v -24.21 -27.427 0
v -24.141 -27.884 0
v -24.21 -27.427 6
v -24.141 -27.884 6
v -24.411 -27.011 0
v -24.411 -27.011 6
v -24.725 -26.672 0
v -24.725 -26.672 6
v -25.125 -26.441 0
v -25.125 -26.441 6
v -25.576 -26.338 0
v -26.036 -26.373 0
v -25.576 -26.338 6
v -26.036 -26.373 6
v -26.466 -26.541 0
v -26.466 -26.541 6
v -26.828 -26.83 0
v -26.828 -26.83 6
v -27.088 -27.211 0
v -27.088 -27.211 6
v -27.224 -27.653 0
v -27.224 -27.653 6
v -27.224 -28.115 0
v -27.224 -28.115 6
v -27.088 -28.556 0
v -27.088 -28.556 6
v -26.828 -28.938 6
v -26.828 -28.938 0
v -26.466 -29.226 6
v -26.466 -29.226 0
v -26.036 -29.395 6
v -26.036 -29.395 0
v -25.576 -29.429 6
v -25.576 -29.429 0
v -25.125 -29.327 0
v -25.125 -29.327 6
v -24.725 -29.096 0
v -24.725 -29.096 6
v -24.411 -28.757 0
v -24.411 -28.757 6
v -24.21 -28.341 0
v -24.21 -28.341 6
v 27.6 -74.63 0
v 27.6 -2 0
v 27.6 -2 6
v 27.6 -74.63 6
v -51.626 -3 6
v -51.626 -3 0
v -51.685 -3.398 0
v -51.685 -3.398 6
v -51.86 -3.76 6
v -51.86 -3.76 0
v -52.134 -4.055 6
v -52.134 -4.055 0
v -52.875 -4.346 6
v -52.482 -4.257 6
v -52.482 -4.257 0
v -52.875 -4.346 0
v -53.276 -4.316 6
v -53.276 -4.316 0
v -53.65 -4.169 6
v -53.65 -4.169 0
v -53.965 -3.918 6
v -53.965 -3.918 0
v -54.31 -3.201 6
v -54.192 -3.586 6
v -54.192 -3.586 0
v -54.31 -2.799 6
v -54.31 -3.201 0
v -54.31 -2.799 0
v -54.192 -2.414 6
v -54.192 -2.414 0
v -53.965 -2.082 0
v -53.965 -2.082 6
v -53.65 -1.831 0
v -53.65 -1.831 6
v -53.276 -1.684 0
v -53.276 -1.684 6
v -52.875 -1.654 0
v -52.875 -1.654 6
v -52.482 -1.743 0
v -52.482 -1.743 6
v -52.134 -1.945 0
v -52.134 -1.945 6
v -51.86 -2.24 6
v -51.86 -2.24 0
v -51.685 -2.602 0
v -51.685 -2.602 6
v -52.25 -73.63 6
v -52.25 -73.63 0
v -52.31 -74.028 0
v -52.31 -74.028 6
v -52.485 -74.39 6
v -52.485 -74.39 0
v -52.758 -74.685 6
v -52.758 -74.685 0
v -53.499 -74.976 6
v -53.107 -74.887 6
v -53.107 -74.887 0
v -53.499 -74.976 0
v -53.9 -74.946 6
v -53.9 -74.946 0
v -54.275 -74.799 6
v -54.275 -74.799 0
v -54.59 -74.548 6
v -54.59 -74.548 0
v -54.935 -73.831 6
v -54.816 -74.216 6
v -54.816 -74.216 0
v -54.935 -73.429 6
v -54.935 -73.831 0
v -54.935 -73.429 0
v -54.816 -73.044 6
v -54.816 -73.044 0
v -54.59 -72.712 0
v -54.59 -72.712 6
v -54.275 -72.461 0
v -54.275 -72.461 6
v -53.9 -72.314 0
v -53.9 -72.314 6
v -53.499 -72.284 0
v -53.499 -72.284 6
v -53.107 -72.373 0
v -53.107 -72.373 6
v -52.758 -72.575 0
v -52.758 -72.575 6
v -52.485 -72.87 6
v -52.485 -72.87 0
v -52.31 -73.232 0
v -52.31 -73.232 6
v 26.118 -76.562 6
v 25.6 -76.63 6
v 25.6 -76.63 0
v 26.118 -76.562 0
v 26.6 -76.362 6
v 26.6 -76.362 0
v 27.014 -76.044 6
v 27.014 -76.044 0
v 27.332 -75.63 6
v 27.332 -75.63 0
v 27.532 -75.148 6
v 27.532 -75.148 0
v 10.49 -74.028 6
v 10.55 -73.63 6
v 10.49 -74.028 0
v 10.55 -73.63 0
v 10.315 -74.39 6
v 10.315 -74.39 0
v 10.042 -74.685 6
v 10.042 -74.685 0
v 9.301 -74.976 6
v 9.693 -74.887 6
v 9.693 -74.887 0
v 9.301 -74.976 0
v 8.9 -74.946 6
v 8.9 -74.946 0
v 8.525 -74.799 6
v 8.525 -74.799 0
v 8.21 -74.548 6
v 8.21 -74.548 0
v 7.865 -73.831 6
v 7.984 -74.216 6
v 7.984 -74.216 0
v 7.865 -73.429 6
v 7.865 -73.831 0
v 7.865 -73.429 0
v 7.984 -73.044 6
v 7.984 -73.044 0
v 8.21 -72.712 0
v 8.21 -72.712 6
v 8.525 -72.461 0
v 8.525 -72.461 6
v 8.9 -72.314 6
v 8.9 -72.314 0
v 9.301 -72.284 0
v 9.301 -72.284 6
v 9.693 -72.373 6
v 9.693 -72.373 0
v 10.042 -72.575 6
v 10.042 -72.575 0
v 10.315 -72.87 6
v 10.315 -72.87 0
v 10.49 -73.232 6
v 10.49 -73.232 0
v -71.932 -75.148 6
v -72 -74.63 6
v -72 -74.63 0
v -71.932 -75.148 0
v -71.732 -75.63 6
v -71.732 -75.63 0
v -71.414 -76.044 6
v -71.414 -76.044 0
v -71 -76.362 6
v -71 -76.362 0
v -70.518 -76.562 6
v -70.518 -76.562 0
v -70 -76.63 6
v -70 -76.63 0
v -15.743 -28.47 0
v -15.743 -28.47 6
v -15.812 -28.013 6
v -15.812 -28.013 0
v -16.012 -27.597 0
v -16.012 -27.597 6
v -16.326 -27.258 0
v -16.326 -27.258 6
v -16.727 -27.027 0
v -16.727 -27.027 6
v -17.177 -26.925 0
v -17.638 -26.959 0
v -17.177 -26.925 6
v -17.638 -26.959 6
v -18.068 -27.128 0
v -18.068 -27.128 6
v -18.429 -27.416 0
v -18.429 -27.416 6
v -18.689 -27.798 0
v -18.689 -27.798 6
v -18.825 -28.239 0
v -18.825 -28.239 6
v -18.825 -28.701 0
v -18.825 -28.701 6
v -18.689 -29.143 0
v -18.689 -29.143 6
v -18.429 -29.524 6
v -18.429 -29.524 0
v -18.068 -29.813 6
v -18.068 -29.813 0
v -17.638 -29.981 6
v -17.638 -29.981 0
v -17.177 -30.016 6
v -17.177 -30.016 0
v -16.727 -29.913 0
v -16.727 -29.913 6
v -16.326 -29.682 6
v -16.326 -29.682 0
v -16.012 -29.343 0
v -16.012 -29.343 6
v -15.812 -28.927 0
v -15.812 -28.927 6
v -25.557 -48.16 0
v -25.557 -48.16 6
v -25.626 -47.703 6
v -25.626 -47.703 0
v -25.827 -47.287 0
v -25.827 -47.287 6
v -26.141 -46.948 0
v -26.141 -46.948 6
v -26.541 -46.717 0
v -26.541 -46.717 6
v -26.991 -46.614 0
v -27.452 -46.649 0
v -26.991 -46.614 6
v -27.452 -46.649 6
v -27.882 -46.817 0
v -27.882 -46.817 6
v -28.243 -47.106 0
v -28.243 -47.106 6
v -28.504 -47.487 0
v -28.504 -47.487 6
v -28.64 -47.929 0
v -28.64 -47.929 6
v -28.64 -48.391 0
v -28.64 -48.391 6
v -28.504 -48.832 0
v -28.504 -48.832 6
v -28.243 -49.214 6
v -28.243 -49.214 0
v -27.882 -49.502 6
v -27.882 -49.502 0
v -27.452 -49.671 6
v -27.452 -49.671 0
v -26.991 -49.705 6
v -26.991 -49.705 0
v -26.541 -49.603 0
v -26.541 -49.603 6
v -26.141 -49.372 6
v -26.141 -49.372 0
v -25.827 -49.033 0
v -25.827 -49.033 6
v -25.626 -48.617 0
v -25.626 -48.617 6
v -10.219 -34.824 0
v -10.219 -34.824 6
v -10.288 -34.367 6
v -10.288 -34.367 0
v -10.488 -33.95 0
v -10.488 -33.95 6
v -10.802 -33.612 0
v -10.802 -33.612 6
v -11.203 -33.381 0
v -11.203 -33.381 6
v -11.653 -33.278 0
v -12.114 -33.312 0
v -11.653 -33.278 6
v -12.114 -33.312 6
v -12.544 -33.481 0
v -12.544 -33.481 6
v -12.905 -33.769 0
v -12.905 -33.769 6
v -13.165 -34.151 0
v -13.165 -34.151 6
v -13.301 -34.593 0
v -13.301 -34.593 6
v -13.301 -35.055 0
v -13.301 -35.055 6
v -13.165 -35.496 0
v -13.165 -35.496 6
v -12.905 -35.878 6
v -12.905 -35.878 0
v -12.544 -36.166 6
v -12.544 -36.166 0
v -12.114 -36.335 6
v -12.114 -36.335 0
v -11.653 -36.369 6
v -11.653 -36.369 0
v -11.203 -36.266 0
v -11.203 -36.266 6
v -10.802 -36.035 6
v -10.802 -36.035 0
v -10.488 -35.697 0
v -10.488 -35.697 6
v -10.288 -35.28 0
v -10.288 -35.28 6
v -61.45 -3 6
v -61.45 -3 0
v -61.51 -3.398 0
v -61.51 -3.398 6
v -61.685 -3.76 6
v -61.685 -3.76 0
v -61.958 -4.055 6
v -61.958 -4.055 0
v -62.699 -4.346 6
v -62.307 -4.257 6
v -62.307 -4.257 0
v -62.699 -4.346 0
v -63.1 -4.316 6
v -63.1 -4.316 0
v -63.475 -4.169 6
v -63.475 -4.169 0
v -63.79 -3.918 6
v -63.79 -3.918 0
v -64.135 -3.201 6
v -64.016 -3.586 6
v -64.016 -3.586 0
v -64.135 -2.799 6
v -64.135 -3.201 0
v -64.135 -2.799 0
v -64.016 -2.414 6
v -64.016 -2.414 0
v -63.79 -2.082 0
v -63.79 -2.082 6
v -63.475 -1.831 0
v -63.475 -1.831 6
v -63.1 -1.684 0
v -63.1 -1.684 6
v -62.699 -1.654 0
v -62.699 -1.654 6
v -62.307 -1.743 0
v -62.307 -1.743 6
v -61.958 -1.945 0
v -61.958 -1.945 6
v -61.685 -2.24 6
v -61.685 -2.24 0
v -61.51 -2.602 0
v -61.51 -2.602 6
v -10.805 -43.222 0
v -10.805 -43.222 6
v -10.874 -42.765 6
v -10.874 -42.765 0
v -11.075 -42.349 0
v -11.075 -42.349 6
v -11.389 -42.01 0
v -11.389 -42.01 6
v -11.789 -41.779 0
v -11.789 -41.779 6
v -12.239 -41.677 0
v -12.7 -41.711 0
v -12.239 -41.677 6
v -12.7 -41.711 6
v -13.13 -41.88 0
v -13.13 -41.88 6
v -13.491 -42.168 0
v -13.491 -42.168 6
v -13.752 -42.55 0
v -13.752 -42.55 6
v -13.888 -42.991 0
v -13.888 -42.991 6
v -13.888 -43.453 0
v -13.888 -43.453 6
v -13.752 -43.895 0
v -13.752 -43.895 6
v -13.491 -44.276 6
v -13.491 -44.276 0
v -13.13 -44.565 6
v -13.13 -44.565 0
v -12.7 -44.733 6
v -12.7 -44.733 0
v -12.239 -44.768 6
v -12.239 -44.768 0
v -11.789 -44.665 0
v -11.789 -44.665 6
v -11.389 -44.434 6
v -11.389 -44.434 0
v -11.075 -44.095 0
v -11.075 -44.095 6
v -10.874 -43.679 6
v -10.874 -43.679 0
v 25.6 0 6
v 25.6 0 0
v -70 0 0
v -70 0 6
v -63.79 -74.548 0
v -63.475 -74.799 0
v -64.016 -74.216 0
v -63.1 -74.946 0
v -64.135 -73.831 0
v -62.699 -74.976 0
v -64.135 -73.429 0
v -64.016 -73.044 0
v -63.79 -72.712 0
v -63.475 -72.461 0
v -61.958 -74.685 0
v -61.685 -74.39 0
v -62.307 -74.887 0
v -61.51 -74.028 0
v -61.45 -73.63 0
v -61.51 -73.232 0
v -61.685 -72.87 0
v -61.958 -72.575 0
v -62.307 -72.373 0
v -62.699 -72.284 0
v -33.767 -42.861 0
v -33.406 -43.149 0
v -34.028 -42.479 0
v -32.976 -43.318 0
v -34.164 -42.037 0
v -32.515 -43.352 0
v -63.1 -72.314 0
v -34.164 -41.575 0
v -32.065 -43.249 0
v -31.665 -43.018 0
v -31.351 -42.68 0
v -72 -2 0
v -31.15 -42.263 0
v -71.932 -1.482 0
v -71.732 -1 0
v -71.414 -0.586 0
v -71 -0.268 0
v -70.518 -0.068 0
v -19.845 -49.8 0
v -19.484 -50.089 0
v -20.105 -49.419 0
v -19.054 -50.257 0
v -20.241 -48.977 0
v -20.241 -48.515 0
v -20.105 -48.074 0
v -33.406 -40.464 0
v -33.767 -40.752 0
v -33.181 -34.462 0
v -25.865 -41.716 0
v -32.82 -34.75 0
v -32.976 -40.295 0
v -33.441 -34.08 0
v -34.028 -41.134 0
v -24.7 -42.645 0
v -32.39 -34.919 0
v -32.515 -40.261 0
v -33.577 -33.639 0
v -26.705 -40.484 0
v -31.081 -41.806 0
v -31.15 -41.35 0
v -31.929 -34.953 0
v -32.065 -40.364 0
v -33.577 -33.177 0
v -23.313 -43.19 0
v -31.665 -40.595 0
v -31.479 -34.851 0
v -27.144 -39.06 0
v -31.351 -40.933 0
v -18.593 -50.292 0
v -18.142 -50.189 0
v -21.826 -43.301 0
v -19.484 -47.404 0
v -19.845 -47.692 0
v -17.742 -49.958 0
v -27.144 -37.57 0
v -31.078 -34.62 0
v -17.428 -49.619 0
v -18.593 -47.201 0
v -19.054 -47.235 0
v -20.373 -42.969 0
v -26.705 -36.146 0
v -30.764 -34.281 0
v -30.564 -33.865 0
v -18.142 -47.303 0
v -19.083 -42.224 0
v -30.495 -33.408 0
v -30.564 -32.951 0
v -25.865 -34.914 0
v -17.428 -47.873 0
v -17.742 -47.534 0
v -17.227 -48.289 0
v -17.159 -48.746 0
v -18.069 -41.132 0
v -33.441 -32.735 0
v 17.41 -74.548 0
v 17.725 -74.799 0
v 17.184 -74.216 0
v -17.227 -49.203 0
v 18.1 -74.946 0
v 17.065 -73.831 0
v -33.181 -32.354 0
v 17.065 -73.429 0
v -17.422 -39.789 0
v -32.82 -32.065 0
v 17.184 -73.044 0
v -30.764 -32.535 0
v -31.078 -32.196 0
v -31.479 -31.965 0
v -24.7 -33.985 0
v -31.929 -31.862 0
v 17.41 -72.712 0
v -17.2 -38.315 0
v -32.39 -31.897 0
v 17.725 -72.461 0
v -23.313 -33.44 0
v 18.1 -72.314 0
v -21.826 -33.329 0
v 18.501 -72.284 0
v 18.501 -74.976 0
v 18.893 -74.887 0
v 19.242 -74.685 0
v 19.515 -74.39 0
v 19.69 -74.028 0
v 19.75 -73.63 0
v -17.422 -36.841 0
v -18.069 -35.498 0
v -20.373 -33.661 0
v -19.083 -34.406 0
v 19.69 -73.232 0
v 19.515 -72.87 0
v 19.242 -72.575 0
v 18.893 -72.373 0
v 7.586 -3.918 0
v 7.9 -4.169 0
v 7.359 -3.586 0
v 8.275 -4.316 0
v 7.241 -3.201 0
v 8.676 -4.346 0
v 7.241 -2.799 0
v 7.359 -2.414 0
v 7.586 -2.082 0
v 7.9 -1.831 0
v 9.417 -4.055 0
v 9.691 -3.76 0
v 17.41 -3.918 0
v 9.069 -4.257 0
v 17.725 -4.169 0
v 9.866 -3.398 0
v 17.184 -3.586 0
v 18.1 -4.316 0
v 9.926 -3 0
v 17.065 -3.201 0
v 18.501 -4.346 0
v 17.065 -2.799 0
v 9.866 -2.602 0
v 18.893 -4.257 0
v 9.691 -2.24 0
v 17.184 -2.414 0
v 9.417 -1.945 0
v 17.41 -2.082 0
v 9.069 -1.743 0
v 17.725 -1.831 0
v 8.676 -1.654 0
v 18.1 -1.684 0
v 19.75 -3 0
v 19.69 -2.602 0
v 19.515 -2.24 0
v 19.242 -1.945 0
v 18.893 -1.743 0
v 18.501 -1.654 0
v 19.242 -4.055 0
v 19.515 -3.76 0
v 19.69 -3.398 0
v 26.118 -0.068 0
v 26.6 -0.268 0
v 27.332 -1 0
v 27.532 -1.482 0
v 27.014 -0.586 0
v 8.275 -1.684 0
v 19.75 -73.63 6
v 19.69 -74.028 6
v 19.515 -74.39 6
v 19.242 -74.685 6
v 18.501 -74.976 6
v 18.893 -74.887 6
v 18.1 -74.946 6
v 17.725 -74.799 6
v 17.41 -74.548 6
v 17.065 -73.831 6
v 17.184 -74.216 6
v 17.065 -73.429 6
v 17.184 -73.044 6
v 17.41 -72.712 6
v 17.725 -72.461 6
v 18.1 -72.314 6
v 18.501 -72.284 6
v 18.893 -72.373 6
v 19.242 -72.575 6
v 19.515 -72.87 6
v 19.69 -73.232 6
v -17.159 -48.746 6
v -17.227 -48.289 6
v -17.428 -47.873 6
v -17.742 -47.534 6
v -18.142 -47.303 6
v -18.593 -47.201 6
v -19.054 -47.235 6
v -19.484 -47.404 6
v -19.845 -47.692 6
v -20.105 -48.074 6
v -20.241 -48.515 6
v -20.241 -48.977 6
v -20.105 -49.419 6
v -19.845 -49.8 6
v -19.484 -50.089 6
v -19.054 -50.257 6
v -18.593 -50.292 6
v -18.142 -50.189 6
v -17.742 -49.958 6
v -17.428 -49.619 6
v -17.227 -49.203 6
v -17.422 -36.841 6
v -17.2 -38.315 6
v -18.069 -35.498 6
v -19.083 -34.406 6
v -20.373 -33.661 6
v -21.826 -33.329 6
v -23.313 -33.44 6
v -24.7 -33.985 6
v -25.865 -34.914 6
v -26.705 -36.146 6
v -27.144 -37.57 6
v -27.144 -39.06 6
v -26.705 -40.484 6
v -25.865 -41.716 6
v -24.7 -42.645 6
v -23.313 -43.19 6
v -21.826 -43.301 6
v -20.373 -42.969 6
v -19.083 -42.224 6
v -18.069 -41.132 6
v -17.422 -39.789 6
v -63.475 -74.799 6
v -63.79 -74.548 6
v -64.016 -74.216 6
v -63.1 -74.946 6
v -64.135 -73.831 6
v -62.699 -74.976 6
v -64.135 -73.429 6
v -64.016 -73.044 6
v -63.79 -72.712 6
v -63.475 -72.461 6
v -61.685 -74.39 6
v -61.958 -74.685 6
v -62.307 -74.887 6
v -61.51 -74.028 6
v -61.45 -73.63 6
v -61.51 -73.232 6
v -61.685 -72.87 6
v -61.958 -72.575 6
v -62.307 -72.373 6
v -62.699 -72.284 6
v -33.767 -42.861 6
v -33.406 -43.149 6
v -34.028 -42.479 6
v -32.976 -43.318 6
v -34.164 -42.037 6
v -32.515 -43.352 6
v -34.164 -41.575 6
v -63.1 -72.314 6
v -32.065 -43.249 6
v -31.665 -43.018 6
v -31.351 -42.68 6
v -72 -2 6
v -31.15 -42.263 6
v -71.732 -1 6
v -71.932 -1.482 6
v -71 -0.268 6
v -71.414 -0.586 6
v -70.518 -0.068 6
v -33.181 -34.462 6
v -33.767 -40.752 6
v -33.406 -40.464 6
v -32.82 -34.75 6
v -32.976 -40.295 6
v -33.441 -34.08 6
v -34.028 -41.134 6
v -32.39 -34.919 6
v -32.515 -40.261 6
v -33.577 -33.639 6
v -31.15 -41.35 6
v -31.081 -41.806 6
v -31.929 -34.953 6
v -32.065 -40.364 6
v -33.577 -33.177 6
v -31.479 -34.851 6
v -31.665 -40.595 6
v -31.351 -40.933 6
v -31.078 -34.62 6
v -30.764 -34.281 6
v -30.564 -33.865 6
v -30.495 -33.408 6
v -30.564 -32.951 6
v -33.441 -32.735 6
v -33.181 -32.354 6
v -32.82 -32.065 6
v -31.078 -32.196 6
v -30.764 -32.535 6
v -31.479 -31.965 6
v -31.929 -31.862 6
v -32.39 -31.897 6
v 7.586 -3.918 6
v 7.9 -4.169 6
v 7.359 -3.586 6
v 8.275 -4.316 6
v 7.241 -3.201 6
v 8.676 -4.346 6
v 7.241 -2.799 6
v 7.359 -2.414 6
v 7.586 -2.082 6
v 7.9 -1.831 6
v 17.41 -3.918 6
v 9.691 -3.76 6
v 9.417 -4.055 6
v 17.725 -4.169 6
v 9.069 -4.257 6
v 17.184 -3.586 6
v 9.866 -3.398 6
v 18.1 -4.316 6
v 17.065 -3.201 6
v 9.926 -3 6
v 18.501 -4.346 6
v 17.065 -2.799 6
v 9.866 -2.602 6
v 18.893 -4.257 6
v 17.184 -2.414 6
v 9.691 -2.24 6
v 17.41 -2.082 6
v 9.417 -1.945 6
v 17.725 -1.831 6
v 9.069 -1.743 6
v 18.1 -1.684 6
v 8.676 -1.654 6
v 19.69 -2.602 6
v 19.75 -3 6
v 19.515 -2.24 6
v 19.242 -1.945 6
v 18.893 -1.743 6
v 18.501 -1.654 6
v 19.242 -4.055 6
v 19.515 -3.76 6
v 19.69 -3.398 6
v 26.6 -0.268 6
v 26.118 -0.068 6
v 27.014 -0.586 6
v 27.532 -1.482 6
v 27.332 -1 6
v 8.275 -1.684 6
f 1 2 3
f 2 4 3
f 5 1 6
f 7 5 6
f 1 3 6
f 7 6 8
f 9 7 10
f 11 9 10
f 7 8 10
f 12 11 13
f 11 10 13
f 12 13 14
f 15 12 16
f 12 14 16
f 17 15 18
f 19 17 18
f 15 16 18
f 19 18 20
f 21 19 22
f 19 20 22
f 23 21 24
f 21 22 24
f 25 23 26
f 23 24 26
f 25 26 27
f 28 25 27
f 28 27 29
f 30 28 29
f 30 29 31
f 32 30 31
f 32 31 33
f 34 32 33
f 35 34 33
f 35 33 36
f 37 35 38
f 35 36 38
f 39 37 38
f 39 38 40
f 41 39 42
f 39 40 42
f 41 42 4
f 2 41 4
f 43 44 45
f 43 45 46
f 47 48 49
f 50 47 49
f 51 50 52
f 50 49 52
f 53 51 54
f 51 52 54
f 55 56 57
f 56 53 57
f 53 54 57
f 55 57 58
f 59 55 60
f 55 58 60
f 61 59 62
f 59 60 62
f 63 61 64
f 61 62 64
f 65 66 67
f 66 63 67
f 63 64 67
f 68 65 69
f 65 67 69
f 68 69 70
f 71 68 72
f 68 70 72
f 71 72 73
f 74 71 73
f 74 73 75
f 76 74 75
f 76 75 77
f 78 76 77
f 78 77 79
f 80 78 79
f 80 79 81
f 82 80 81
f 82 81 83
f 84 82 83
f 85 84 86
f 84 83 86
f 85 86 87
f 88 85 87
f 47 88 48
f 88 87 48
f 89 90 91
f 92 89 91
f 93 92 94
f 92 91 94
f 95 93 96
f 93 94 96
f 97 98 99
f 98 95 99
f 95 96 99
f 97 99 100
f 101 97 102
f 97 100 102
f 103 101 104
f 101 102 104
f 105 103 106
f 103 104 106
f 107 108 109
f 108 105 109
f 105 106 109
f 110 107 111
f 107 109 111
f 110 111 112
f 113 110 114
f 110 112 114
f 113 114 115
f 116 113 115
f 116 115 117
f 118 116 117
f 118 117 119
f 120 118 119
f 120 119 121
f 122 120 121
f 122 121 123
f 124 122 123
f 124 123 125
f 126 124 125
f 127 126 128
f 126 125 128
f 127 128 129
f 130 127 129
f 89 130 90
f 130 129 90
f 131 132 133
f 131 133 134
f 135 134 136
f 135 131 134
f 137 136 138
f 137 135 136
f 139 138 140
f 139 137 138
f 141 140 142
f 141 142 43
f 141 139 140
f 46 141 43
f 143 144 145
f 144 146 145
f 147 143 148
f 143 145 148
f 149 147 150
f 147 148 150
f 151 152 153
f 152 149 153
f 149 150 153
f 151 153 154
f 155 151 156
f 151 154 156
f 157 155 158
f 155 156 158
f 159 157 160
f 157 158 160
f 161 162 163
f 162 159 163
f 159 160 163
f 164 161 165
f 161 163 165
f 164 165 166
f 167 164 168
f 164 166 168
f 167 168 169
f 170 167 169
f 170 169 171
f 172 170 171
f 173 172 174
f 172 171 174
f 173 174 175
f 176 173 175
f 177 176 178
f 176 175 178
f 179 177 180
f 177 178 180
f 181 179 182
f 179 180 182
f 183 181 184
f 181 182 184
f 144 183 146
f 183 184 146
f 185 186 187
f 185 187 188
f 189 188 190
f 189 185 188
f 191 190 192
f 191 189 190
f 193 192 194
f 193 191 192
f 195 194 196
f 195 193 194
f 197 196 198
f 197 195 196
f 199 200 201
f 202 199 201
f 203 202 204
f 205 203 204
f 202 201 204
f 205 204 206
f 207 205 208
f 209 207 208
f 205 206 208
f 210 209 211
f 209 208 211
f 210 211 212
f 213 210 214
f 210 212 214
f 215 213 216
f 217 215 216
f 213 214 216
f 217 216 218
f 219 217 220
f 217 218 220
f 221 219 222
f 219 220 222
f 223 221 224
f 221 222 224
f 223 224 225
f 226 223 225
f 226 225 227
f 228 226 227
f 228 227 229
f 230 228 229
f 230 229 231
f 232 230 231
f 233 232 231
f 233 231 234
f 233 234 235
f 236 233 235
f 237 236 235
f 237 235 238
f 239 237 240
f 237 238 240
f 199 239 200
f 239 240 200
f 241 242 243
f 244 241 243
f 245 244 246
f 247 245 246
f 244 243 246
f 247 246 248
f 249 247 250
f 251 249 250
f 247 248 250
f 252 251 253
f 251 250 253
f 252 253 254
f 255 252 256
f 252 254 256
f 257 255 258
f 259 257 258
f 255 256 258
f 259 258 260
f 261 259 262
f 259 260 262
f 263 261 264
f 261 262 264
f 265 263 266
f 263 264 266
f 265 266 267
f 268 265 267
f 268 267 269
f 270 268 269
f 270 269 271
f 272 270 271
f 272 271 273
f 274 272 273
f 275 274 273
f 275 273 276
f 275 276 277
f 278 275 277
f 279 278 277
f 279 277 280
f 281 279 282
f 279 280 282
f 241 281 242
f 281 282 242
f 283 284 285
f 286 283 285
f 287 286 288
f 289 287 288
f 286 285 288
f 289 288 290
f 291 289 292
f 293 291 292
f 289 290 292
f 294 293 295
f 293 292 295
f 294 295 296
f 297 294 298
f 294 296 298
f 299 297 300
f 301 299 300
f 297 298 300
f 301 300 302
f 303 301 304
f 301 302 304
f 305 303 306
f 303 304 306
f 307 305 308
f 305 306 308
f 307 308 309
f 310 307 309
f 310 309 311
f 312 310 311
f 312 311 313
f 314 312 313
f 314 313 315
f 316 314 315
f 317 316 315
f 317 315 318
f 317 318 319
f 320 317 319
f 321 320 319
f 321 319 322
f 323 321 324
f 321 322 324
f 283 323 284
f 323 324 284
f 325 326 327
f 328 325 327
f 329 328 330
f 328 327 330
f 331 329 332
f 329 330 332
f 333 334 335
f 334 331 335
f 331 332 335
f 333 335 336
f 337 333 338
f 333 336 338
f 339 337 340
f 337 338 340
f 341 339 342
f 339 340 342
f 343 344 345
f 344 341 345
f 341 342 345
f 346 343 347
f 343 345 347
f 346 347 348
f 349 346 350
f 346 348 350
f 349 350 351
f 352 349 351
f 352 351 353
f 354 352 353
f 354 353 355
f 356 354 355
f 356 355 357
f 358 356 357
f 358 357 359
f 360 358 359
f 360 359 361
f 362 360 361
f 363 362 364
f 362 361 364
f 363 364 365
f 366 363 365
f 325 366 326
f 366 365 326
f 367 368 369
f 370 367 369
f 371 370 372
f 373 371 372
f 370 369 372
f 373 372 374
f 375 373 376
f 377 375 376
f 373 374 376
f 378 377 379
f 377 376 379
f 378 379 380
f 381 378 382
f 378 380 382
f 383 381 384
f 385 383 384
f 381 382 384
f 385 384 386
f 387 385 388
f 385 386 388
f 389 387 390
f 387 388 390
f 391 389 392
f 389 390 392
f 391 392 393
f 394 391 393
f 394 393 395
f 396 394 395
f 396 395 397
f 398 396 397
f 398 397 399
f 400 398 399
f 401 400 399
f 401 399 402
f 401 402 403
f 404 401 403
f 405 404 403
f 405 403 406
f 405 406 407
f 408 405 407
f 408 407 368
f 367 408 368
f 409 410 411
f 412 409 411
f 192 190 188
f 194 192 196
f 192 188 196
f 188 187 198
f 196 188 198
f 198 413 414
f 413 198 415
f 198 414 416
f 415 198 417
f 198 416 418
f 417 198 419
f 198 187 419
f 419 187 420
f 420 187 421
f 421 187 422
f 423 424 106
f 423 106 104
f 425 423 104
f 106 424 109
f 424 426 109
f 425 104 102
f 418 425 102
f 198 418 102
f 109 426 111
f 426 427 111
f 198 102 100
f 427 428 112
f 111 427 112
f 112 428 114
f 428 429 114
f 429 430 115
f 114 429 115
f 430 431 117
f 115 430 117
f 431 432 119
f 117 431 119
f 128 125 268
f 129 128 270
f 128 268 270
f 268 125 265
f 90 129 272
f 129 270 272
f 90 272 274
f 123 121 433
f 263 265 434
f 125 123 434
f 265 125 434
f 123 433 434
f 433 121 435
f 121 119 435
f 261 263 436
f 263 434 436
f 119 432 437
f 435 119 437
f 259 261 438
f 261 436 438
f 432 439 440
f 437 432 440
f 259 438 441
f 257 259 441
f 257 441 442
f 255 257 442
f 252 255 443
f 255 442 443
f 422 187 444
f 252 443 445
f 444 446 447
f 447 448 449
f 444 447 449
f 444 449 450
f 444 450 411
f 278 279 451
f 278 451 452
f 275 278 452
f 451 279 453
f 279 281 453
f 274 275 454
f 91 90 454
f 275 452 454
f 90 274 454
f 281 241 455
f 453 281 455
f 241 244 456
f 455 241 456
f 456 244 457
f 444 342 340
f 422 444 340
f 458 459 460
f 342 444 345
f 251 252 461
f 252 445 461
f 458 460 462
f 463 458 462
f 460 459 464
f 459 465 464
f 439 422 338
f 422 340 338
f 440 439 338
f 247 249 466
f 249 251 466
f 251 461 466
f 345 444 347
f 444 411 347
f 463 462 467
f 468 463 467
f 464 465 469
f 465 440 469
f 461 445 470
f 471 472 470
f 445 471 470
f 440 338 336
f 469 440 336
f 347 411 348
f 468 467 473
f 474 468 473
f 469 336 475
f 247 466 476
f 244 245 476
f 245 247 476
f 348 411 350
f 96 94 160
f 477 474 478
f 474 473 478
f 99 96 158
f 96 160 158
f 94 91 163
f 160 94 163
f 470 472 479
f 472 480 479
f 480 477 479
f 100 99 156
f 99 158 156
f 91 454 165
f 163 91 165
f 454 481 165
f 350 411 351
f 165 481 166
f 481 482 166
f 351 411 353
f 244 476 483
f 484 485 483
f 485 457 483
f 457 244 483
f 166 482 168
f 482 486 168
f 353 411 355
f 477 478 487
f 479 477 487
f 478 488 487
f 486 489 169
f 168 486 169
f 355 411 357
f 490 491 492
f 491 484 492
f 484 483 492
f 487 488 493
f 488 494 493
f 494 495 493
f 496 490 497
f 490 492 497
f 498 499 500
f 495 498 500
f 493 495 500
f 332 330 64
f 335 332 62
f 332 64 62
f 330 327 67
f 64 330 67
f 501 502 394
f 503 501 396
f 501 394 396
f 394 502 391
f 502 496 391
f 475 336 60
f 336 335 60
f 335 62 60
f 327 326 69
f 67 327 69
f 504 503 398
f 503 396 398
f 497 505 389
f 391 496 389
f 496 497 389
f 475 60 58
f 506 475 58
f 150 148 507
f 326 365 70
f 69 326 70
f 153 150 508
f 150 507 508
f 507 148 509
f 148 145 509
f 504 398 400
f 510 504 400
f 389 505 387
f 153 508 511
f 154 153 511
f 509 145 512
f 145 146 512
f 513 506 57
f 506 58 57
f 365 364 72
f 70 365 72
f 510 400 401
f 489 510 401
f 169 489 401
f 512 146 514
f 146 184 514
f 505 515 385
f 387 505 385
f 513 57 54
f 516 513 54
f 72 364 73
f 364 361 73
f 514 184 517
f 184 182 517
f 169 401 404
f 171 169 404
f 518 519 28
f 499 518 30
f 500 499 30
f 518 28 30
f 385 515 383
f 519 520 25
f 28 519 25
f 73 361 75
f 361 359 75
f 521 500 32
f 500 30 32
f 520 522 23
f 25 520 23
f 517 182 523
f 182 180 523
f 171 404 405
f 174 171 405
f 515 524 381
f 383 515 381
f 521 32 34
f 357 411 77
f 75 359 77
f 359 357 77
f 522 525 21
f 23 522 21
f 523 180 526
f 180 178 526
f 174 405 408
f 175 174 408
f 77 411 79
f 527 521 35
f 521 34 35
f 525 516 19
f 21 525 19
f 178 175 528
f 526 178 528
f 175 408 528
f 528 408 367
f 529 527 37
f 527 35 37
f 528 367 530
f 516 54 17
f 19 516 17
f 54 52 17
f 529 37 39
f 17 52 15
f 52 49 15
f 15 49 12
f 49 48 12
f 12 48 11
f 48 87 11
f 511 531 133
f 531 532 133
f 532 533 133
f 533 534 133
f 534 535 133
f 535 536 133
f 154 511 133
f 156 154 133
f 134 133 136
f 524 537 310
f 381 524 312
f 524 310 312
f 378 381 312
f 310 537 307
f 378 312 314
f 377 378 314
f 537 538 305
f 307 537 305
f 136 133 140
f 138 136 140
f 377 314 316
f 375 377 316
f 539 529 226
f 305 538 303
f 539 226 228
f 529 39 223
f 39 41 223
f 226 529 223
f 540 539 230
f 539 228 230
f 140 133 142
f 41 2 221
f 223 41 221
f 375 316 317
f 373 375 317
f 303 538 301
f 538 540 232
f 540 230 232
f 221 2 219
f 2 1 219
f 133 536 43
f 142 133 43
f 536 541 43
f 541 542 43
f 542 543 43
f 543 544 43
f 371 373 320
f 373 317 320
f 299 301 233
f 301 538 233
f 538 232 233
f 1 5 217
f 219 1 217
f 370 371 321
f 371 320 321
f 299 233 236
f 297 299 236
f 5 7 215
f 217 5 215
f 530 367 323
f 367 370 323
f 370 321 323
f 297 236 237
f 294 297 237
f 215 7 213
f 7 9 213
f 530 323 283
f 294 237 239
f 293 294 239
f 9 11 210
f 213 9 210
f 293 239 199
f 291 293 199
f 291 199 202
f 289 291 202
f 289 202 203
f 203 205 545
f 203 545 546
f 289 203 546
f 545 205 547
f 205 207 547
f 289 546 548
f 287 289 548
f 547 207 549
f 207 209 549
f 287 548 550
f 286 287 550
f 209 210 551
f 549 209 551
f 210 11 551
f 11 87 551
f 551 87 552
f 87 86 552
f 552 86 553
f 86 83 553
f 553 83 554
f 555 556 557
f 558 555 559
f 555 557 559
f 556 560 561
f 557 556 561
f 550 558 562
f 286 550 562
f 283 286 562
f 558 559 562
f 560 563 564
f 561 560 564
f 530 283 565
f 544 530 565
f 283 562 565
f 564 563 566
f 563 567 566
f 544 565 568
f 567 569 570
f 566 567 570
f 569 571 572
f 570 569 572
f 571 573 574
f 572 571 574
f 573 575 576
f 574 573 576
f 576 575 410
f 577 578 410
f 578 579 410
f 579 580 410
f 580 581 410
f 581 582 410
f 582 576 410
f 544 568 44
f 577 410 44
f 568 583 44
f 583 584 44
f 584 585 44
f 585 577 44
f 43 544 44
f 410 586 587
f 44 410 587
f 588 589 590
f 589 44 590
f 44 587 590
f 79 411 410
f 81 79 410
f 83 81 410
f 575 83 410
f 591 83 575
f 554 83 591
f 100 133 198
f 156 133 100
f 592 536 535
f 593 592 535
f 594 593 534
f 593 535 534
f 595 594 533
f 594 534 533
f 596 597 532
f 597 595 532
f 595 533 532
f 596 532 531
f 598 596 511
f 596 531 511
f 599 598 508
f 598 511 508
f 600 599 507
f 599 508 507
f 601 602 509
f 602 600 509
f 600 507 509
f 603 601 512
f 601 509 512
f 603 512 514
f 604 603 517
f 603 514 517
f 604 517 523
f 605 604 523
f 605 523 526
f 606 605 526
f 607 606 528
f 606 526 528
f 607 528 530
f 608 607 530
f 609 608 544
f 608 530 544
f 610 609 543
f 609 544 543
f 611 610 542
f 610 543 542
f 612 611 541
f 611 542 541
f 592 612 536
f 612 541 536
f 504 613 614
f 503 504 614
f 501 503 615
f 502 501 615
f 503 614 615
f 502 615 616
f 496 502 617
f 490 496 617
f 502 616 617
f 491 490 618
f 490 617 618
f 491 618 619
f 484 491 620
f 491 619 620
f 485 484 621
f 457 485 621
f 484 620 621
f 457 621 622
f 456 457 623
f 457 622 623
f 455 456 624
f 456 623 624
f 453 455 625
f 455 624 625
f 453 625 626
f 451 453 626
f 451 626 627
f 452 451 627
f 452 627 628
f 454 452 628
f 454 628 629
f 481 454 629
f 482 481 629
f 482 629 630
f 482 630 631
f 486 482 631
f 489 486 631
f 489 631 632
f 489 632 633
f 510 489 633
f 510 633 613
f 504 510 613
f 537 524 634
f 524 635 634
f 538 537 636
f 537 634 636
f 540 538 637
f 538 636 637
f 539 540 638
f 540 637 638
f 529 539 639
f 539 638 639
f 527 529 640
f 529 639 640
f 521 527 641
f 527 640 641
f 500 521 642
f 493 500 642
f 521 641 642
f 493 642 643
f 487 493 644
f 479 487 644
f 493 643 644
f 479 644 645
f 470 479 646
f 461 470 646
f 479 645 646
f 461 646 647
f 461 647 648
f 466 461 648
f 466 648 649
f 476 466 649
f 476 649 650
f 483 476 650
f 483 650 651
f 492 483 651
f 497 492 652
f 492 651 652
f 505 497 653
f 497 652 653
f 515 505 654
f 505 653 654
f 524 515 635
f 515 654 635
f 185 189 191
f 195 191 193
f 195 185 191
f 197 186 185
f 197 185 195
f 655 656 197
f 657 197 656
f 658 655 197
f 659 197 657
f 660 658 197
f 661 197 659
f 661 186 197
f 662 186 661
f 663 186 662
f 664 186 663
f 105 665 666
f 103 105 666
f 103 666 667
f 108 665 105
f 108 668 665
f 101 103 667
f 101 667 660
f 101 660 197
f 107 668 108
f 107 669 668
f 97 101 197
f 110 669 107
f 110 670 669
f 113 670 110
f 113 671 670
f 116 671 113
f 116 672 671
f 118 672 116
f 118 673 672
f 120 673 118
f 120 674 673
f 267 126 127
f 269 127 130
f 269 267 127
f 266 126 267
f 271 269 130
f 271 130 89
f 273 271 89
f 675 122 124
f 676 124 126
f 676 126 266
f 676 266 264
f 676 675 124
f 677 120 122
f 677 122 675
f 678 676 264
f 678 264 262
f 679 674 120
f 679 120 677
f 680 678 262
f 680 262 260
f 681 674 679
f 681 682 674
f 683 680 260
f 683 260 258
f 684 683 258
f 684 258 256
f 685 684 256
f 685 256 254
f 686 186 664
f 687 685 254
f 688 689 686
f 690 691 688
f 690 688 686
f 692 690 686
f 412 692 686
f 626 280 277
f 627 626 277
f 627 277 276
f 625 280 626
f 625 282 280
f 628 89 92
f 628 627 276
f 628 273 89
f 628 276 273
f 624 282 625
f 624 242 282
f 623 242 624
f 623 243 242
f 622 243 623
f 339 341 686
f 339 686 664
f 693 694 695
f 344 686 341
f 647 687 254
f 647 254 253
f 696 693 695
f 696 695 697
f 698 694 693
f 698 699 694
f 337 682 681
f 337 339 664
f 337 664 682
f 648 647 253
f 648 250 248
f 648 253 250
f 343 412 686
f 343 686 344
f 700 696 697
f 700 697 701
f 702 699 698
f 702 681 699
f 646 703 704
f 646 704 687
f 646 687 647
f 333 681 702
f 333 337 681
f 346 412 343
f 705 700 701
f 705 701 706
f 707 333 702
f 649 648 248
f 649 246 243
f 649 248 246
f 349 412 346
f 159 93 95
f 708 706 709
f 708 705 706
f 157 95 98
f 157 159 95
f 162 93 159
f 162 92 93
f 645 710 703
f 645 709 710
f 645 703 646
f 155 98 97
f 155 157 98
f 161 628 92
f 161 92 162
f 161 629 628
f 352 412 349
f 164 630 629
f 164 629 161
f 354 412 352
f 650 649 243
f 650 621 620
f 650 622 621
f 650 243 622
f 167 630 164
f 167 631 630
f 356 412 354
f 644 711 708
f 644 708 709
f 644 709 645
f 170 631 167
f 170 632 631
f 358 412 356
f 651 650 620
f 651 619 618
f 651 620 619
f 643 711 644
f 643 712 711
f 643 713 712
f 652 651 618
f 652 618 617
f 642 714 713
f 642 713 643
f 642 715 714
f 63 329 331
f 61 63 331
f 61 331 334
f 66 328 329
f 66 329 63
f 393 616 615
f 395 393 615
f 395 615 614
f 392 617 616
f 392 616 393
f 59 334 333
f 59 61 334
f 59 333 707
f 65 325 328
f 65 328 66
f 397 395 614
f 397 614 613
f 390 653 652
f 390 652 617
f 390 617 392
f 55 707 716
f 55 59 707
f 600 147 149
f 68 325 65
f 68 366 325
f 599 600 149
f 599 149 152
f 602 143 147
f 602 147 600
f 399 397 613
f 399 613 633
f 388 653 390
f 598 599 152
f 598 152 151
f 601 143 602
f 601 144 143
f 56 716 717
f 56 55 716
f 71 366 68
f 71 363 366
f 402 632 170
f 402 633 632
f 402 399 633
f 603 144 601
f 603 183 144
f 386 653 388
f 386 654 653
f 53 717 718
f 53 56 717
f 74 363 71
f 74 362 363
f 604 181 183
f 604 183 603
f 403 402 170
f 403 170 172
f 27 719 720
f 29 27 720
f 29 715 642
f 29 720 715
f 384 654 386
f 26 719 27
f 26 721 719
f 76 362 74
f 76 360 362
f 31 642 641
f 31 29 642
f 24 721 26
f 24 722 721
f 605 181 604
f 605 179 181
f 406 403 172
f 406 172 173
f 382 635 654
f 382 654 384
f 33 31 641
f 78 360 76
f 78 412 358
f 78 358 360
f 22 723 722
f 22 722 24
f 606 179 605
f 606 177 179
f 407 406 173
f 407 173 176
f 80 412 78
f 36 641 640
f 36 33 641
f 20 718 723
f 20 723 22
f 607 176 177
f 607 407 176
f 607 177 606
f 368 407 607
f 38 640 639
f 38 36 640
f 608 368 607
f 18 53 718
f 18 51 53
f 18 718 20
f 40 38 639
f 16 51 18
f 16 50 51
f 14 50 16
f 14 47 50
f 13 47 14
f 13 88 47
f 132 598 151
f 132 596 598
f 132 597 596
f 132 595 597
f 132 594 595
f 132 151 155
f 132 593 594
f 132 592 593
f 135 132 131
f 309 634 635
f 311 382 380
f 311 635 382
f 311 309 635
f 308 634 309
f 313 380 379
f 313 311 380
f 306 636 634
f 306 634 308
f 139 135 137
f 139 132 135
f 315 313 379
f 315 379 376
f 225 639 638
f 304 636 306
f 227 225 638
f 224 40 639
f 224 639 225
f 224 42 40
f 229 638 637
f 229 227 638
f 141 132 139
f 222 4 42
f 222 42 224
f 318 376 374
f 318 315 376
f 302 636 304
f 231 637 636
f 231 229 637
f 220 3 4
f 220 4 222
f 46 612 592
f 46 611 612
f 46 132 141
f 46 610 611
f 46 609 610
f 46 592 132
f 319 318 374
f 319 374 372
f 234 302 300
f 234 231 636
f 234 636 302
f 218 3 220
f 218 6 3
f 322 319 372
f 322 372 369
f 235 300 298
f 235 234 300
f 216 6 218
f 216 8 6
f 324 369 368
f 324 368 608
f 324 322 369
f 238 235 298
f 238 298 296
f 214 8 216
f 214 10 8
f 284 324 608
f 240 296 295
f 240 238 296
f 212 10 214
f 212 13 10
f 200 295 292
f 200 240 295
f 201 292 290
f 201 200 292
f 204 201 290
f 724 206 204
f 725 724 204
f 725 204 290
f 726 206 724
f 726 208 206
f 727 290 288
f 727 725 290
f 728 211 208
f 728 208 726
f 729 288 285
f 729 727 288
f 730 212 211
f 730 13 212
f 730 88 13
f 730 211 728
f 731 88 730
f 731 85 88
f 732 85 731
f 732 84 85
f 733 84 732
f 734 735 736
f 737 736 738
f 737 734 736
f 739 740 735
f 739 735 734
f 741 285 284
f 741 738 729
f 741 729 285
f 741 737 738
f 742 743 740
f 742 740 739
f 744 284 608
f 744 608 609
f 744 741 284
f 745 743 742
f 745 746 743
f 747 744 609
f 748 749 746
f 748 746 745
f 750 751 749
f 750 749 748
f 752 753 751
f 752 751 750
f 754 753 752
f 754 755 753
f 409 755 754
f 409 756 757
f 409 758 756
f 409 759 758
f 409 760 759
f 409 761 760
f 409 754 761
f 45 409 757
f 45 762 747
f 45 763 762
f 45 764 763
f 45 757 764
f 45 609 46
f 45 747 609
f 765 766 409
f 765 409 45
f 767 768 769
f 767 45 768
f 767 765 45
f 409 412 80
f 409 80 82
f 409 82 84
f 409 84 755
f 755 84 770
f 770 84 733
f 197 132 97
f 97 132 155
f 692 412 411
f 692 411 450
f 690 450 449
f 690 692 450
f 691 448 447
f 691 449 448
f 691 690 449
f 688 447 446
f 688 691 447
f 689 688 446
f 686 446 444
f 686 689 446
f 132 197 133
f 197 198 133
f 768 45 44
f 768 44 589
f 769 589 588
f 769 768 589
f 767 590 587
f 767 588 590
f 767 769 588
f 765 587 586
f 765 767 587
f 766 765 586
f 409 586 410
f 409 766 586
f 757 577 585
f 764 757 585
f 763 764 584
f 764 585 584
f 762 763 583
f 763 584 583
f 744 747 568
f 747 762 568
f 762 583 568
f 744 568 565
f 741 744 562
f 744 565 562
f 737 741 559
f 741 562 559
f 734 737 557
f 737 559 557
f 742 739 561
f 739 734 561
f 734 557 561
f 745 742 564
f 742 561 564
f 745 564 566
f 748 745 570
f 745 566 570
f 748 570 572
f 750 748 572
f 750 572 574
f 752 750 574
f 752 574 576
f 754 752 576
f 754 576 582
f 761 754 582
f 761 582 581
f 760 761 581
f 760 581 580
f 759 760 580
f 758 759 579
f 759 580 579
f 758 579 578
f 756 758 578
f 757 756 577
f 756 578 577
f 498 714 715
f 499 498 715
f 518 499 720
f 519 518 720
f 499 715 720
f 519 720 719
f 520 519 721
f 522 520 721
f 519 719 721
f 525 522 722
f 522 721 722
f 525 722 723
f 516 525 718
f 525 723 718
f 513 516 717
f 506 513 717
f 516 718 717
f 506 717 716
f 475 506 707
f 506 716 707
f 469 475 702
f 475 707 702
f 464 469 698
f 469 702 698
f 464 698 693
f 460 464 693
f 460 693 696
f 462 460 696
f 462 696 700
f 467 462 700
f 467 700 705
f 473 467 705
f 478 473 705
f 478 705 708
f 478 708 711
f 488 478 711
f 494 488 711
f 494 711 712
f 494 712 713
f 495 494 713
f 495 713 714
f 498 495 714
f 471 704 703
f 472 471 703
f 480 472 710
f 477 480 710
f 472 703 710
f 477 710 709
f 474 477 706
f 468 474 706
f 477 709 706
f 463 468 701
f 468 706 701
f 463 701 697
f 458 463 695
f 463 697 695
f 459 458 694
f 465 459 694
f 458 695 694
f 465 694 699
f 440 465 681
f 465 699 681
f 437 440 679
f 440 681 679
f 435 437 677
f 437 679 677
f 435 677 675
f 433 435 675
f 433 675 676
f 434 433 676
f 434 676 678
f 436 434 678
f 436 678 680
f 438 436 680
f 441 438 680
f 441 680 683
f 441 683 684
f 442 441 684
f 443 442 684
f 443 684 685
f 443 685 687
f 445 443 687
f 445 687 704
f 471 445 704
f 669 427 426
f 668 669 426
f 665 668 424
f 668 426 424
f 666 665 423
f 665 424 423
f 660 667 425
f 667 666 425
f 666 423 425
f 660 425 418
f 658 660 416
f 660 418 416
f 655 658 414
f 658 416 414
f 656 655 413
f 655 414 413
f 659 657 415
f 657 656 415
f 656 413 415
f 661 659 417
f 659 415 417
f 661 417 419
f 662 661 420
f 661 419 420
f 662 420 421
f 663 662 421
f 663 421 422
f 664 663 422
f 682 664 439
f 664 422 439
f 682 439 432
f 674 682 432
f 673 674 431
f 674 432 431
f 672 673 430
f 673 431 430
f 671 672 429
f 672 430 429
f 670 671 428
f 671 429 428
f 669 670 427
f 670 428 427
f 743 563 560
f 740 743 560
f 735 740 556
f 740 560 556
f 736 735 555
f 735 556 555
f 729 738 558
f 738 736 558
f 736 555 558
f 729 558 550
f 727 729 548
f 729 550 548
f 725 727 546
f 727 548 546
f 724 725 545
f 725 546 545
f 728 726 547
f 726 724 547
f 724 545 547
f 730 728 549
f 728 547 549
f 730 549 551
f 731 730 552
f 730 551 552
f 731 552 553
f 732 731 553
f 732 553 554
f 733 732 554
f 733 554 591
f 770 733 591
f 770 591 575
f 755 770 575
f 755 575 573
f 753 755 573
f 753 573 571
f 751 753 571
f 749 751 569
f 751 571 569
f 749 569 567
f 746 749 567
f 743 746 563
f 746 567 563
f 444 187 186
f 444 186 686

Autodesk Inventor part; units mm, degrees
ref_plane "YZ Plane" through (0, 0, 0) normal (1, 0, 0) x (0, 1, 0)
ref_plane "XZ Plane" through (0, 0, 0) normal (0, 1, 0) x (-1, 0, 0)
ref_plane "XY Plane" through (0, 0, 0) normal (0, 0, 1) x (1, 0, 0)
ref_plane "작업 평면1" through (0, 0, 0) normal (0, 0, 1) x (1, 0, 0)
ref_plane "작업 평면2" through (0, 0, 0) normal (0, 0, 1) x (1, 0, 0)
sketch "스케치2" plane through (0, 0, 0) normal (0, 0, 1) x (1, 0, 0)
  circle A0 centre (-53.6, -73.63) radius 1.35 projected
  circle A1 centre (-62.8, -73.63) radius 1.35 projected
  line L0 (-72, -70.63) -> (-44.4, -70.63) projected
  line L1 (-72, -70.63) -> (-72, -76.63) projected
  line L2 (-72, -76.63) -> (-44.4, -76.63) projected
  line L3 (-44.4, -70.63) -> (-44.4, -76.63) projected
  circle A2 centre (18.4, -73.63) radius 1.35 projected
  circle A3 centre (9.2, -73.63) radius 1.35 projected
  line L4 (0, -70.63) -> (27.6, -70.63) projected
  line L5 (0, -70.63) -> (0, -76.63) projected
  line L6 (0, -76.63) -> (27.6, -76.63) projected
  line L7 (27.6, -70.63) -> (27.6, -76.63) projected
  circle A4 centre (18.4, -3) radius 1.35 projected
  circle A5 centre (8.5755, -3) radius 1.35 projected
  line L8 (0, 0) -> (27.6, 0) projected
  line L9 (0, 0) -> (0, -6) projected
  line L10 (0, -6) -> (27.6, -6) projected
  line L11 (27.6, 0) -> (27.6, -6) projected
  circle A6 centre (-62.8, -3) radius 1.35 projected
  circle A7 centre (-52.9755, -3) radius 1.35 projected
  line L12 (-44.4, 0) -> (-72, 0) projected
  line L13 (-72, 0) -> (-72, -6) projected
  line L14 (-44.4, -6) -> (-72, -6) projected
  line L15 (-44.4, 0) -> (-44.4, -6) projected
  line L16 (27.6, 0) -> (27.6, -76.63)
  line L17 (27.6, -76.63) -> (-72, -76.63)
  line L18 (-72, -76.63) -> (-72, 0)
  line L19 (-72, 0) -> (27.6, 0)
  point P0 (27.6, -70.63)
  point P1 (27.6, -6)
extrude "돌출1" add sketch "스케치2" along normal blind 6
sketch "스케치3" plane through (0, 0, 6) normal (0, 0, 1) x (1, 0, 0)
  line L0 (-72, -76.63) -> (27.6, -76.63) projected
  line L1 (27.6, 0) -> (-72, 0) projected
  line L2 (-72, -76.63) -> (-72, 0)
  line L3 (-72, 0) -> (-72, -42.4915)
  line L4 (-22.2, -76.63) -> (-22.2, 0)
  line L5 (-72, -38.315) -> (27.6, -38.315)
  circle A0 centre (-22.2, -38.315) radius 5
  point P0 (0, 0)
  dimension "d3" = 10
extrude "돌출2" cut sketch "스케치3" against normal blind 6 contours A0 L5 L4 | L4 L5 A0 | L5 A0 L4 | L4 A0 L5
sketch "스케치4" plane through (0, 0, 6) normal (0, 0, 1) x (1, 0, 0)
  circle A0 centre (-22.2, -38.315) radius 13.9 projected
  circle A1 centre (-25.6914, -27.8838) radius 1.25 projected
  circle A2 centre (-32.0448, -33.4078) radius 1.55 projected
  circle A3 centre (-17.2928, -28.4702) radius 1.25 projected
  circle A4 centre (-11.7688, -34.8236) radius 1.25 projected
  circle A5 centre (-12.3552, -43.2222) radius 1.25 projected
  circle A6 centre (-18.7086, -48.7462) radius 1.55 projected
  circle A7 centre (-27.1072, -48.1598) radius 1.55 projected
  circle A8 centre (-32.6312, -41.8064) radius 1.55 projected
  circle A9 centre (-25.6914, -27.8838) radius 1.55 projected
  circle A10 centre (-17.2928, -28.4702) radius 1.55 projected
  circle A11 centre (-11.7688, -34.8236) radius 1.55 projected
  circle A12 centre (-12.3552, -43.2222) radius 1.55 projected
  circle A13 centre (-32.6312, -41.8064) radius 1.25 projected
  circle A14 centre (-27.1072, -48.1598) radius 1.25 projected
  circle A15 centre (-18.7086, -48.7462) radius 1.25 projected
  circle A16 centre (-32.0448, -33.4078) radius 1.25 projected
  point P0 (0, 0)
extrude "돌출3" cut sketch "스케치4" against normal blind 6 contours A1 | A2 | A3 | A4 | A5 | A6 | A7 | A8 | A9 | A10 | A11 | A12 | A13 | A14 | A15 | A16
fillet "모깎기1" radius 2 4 edges at (-72, 0, 3) (27.6, 0, 3) (27.6, -76.63, 3) (-72, -76.63, 3)
properties part number "_pelvis" material "PMMA 플라스틱"
